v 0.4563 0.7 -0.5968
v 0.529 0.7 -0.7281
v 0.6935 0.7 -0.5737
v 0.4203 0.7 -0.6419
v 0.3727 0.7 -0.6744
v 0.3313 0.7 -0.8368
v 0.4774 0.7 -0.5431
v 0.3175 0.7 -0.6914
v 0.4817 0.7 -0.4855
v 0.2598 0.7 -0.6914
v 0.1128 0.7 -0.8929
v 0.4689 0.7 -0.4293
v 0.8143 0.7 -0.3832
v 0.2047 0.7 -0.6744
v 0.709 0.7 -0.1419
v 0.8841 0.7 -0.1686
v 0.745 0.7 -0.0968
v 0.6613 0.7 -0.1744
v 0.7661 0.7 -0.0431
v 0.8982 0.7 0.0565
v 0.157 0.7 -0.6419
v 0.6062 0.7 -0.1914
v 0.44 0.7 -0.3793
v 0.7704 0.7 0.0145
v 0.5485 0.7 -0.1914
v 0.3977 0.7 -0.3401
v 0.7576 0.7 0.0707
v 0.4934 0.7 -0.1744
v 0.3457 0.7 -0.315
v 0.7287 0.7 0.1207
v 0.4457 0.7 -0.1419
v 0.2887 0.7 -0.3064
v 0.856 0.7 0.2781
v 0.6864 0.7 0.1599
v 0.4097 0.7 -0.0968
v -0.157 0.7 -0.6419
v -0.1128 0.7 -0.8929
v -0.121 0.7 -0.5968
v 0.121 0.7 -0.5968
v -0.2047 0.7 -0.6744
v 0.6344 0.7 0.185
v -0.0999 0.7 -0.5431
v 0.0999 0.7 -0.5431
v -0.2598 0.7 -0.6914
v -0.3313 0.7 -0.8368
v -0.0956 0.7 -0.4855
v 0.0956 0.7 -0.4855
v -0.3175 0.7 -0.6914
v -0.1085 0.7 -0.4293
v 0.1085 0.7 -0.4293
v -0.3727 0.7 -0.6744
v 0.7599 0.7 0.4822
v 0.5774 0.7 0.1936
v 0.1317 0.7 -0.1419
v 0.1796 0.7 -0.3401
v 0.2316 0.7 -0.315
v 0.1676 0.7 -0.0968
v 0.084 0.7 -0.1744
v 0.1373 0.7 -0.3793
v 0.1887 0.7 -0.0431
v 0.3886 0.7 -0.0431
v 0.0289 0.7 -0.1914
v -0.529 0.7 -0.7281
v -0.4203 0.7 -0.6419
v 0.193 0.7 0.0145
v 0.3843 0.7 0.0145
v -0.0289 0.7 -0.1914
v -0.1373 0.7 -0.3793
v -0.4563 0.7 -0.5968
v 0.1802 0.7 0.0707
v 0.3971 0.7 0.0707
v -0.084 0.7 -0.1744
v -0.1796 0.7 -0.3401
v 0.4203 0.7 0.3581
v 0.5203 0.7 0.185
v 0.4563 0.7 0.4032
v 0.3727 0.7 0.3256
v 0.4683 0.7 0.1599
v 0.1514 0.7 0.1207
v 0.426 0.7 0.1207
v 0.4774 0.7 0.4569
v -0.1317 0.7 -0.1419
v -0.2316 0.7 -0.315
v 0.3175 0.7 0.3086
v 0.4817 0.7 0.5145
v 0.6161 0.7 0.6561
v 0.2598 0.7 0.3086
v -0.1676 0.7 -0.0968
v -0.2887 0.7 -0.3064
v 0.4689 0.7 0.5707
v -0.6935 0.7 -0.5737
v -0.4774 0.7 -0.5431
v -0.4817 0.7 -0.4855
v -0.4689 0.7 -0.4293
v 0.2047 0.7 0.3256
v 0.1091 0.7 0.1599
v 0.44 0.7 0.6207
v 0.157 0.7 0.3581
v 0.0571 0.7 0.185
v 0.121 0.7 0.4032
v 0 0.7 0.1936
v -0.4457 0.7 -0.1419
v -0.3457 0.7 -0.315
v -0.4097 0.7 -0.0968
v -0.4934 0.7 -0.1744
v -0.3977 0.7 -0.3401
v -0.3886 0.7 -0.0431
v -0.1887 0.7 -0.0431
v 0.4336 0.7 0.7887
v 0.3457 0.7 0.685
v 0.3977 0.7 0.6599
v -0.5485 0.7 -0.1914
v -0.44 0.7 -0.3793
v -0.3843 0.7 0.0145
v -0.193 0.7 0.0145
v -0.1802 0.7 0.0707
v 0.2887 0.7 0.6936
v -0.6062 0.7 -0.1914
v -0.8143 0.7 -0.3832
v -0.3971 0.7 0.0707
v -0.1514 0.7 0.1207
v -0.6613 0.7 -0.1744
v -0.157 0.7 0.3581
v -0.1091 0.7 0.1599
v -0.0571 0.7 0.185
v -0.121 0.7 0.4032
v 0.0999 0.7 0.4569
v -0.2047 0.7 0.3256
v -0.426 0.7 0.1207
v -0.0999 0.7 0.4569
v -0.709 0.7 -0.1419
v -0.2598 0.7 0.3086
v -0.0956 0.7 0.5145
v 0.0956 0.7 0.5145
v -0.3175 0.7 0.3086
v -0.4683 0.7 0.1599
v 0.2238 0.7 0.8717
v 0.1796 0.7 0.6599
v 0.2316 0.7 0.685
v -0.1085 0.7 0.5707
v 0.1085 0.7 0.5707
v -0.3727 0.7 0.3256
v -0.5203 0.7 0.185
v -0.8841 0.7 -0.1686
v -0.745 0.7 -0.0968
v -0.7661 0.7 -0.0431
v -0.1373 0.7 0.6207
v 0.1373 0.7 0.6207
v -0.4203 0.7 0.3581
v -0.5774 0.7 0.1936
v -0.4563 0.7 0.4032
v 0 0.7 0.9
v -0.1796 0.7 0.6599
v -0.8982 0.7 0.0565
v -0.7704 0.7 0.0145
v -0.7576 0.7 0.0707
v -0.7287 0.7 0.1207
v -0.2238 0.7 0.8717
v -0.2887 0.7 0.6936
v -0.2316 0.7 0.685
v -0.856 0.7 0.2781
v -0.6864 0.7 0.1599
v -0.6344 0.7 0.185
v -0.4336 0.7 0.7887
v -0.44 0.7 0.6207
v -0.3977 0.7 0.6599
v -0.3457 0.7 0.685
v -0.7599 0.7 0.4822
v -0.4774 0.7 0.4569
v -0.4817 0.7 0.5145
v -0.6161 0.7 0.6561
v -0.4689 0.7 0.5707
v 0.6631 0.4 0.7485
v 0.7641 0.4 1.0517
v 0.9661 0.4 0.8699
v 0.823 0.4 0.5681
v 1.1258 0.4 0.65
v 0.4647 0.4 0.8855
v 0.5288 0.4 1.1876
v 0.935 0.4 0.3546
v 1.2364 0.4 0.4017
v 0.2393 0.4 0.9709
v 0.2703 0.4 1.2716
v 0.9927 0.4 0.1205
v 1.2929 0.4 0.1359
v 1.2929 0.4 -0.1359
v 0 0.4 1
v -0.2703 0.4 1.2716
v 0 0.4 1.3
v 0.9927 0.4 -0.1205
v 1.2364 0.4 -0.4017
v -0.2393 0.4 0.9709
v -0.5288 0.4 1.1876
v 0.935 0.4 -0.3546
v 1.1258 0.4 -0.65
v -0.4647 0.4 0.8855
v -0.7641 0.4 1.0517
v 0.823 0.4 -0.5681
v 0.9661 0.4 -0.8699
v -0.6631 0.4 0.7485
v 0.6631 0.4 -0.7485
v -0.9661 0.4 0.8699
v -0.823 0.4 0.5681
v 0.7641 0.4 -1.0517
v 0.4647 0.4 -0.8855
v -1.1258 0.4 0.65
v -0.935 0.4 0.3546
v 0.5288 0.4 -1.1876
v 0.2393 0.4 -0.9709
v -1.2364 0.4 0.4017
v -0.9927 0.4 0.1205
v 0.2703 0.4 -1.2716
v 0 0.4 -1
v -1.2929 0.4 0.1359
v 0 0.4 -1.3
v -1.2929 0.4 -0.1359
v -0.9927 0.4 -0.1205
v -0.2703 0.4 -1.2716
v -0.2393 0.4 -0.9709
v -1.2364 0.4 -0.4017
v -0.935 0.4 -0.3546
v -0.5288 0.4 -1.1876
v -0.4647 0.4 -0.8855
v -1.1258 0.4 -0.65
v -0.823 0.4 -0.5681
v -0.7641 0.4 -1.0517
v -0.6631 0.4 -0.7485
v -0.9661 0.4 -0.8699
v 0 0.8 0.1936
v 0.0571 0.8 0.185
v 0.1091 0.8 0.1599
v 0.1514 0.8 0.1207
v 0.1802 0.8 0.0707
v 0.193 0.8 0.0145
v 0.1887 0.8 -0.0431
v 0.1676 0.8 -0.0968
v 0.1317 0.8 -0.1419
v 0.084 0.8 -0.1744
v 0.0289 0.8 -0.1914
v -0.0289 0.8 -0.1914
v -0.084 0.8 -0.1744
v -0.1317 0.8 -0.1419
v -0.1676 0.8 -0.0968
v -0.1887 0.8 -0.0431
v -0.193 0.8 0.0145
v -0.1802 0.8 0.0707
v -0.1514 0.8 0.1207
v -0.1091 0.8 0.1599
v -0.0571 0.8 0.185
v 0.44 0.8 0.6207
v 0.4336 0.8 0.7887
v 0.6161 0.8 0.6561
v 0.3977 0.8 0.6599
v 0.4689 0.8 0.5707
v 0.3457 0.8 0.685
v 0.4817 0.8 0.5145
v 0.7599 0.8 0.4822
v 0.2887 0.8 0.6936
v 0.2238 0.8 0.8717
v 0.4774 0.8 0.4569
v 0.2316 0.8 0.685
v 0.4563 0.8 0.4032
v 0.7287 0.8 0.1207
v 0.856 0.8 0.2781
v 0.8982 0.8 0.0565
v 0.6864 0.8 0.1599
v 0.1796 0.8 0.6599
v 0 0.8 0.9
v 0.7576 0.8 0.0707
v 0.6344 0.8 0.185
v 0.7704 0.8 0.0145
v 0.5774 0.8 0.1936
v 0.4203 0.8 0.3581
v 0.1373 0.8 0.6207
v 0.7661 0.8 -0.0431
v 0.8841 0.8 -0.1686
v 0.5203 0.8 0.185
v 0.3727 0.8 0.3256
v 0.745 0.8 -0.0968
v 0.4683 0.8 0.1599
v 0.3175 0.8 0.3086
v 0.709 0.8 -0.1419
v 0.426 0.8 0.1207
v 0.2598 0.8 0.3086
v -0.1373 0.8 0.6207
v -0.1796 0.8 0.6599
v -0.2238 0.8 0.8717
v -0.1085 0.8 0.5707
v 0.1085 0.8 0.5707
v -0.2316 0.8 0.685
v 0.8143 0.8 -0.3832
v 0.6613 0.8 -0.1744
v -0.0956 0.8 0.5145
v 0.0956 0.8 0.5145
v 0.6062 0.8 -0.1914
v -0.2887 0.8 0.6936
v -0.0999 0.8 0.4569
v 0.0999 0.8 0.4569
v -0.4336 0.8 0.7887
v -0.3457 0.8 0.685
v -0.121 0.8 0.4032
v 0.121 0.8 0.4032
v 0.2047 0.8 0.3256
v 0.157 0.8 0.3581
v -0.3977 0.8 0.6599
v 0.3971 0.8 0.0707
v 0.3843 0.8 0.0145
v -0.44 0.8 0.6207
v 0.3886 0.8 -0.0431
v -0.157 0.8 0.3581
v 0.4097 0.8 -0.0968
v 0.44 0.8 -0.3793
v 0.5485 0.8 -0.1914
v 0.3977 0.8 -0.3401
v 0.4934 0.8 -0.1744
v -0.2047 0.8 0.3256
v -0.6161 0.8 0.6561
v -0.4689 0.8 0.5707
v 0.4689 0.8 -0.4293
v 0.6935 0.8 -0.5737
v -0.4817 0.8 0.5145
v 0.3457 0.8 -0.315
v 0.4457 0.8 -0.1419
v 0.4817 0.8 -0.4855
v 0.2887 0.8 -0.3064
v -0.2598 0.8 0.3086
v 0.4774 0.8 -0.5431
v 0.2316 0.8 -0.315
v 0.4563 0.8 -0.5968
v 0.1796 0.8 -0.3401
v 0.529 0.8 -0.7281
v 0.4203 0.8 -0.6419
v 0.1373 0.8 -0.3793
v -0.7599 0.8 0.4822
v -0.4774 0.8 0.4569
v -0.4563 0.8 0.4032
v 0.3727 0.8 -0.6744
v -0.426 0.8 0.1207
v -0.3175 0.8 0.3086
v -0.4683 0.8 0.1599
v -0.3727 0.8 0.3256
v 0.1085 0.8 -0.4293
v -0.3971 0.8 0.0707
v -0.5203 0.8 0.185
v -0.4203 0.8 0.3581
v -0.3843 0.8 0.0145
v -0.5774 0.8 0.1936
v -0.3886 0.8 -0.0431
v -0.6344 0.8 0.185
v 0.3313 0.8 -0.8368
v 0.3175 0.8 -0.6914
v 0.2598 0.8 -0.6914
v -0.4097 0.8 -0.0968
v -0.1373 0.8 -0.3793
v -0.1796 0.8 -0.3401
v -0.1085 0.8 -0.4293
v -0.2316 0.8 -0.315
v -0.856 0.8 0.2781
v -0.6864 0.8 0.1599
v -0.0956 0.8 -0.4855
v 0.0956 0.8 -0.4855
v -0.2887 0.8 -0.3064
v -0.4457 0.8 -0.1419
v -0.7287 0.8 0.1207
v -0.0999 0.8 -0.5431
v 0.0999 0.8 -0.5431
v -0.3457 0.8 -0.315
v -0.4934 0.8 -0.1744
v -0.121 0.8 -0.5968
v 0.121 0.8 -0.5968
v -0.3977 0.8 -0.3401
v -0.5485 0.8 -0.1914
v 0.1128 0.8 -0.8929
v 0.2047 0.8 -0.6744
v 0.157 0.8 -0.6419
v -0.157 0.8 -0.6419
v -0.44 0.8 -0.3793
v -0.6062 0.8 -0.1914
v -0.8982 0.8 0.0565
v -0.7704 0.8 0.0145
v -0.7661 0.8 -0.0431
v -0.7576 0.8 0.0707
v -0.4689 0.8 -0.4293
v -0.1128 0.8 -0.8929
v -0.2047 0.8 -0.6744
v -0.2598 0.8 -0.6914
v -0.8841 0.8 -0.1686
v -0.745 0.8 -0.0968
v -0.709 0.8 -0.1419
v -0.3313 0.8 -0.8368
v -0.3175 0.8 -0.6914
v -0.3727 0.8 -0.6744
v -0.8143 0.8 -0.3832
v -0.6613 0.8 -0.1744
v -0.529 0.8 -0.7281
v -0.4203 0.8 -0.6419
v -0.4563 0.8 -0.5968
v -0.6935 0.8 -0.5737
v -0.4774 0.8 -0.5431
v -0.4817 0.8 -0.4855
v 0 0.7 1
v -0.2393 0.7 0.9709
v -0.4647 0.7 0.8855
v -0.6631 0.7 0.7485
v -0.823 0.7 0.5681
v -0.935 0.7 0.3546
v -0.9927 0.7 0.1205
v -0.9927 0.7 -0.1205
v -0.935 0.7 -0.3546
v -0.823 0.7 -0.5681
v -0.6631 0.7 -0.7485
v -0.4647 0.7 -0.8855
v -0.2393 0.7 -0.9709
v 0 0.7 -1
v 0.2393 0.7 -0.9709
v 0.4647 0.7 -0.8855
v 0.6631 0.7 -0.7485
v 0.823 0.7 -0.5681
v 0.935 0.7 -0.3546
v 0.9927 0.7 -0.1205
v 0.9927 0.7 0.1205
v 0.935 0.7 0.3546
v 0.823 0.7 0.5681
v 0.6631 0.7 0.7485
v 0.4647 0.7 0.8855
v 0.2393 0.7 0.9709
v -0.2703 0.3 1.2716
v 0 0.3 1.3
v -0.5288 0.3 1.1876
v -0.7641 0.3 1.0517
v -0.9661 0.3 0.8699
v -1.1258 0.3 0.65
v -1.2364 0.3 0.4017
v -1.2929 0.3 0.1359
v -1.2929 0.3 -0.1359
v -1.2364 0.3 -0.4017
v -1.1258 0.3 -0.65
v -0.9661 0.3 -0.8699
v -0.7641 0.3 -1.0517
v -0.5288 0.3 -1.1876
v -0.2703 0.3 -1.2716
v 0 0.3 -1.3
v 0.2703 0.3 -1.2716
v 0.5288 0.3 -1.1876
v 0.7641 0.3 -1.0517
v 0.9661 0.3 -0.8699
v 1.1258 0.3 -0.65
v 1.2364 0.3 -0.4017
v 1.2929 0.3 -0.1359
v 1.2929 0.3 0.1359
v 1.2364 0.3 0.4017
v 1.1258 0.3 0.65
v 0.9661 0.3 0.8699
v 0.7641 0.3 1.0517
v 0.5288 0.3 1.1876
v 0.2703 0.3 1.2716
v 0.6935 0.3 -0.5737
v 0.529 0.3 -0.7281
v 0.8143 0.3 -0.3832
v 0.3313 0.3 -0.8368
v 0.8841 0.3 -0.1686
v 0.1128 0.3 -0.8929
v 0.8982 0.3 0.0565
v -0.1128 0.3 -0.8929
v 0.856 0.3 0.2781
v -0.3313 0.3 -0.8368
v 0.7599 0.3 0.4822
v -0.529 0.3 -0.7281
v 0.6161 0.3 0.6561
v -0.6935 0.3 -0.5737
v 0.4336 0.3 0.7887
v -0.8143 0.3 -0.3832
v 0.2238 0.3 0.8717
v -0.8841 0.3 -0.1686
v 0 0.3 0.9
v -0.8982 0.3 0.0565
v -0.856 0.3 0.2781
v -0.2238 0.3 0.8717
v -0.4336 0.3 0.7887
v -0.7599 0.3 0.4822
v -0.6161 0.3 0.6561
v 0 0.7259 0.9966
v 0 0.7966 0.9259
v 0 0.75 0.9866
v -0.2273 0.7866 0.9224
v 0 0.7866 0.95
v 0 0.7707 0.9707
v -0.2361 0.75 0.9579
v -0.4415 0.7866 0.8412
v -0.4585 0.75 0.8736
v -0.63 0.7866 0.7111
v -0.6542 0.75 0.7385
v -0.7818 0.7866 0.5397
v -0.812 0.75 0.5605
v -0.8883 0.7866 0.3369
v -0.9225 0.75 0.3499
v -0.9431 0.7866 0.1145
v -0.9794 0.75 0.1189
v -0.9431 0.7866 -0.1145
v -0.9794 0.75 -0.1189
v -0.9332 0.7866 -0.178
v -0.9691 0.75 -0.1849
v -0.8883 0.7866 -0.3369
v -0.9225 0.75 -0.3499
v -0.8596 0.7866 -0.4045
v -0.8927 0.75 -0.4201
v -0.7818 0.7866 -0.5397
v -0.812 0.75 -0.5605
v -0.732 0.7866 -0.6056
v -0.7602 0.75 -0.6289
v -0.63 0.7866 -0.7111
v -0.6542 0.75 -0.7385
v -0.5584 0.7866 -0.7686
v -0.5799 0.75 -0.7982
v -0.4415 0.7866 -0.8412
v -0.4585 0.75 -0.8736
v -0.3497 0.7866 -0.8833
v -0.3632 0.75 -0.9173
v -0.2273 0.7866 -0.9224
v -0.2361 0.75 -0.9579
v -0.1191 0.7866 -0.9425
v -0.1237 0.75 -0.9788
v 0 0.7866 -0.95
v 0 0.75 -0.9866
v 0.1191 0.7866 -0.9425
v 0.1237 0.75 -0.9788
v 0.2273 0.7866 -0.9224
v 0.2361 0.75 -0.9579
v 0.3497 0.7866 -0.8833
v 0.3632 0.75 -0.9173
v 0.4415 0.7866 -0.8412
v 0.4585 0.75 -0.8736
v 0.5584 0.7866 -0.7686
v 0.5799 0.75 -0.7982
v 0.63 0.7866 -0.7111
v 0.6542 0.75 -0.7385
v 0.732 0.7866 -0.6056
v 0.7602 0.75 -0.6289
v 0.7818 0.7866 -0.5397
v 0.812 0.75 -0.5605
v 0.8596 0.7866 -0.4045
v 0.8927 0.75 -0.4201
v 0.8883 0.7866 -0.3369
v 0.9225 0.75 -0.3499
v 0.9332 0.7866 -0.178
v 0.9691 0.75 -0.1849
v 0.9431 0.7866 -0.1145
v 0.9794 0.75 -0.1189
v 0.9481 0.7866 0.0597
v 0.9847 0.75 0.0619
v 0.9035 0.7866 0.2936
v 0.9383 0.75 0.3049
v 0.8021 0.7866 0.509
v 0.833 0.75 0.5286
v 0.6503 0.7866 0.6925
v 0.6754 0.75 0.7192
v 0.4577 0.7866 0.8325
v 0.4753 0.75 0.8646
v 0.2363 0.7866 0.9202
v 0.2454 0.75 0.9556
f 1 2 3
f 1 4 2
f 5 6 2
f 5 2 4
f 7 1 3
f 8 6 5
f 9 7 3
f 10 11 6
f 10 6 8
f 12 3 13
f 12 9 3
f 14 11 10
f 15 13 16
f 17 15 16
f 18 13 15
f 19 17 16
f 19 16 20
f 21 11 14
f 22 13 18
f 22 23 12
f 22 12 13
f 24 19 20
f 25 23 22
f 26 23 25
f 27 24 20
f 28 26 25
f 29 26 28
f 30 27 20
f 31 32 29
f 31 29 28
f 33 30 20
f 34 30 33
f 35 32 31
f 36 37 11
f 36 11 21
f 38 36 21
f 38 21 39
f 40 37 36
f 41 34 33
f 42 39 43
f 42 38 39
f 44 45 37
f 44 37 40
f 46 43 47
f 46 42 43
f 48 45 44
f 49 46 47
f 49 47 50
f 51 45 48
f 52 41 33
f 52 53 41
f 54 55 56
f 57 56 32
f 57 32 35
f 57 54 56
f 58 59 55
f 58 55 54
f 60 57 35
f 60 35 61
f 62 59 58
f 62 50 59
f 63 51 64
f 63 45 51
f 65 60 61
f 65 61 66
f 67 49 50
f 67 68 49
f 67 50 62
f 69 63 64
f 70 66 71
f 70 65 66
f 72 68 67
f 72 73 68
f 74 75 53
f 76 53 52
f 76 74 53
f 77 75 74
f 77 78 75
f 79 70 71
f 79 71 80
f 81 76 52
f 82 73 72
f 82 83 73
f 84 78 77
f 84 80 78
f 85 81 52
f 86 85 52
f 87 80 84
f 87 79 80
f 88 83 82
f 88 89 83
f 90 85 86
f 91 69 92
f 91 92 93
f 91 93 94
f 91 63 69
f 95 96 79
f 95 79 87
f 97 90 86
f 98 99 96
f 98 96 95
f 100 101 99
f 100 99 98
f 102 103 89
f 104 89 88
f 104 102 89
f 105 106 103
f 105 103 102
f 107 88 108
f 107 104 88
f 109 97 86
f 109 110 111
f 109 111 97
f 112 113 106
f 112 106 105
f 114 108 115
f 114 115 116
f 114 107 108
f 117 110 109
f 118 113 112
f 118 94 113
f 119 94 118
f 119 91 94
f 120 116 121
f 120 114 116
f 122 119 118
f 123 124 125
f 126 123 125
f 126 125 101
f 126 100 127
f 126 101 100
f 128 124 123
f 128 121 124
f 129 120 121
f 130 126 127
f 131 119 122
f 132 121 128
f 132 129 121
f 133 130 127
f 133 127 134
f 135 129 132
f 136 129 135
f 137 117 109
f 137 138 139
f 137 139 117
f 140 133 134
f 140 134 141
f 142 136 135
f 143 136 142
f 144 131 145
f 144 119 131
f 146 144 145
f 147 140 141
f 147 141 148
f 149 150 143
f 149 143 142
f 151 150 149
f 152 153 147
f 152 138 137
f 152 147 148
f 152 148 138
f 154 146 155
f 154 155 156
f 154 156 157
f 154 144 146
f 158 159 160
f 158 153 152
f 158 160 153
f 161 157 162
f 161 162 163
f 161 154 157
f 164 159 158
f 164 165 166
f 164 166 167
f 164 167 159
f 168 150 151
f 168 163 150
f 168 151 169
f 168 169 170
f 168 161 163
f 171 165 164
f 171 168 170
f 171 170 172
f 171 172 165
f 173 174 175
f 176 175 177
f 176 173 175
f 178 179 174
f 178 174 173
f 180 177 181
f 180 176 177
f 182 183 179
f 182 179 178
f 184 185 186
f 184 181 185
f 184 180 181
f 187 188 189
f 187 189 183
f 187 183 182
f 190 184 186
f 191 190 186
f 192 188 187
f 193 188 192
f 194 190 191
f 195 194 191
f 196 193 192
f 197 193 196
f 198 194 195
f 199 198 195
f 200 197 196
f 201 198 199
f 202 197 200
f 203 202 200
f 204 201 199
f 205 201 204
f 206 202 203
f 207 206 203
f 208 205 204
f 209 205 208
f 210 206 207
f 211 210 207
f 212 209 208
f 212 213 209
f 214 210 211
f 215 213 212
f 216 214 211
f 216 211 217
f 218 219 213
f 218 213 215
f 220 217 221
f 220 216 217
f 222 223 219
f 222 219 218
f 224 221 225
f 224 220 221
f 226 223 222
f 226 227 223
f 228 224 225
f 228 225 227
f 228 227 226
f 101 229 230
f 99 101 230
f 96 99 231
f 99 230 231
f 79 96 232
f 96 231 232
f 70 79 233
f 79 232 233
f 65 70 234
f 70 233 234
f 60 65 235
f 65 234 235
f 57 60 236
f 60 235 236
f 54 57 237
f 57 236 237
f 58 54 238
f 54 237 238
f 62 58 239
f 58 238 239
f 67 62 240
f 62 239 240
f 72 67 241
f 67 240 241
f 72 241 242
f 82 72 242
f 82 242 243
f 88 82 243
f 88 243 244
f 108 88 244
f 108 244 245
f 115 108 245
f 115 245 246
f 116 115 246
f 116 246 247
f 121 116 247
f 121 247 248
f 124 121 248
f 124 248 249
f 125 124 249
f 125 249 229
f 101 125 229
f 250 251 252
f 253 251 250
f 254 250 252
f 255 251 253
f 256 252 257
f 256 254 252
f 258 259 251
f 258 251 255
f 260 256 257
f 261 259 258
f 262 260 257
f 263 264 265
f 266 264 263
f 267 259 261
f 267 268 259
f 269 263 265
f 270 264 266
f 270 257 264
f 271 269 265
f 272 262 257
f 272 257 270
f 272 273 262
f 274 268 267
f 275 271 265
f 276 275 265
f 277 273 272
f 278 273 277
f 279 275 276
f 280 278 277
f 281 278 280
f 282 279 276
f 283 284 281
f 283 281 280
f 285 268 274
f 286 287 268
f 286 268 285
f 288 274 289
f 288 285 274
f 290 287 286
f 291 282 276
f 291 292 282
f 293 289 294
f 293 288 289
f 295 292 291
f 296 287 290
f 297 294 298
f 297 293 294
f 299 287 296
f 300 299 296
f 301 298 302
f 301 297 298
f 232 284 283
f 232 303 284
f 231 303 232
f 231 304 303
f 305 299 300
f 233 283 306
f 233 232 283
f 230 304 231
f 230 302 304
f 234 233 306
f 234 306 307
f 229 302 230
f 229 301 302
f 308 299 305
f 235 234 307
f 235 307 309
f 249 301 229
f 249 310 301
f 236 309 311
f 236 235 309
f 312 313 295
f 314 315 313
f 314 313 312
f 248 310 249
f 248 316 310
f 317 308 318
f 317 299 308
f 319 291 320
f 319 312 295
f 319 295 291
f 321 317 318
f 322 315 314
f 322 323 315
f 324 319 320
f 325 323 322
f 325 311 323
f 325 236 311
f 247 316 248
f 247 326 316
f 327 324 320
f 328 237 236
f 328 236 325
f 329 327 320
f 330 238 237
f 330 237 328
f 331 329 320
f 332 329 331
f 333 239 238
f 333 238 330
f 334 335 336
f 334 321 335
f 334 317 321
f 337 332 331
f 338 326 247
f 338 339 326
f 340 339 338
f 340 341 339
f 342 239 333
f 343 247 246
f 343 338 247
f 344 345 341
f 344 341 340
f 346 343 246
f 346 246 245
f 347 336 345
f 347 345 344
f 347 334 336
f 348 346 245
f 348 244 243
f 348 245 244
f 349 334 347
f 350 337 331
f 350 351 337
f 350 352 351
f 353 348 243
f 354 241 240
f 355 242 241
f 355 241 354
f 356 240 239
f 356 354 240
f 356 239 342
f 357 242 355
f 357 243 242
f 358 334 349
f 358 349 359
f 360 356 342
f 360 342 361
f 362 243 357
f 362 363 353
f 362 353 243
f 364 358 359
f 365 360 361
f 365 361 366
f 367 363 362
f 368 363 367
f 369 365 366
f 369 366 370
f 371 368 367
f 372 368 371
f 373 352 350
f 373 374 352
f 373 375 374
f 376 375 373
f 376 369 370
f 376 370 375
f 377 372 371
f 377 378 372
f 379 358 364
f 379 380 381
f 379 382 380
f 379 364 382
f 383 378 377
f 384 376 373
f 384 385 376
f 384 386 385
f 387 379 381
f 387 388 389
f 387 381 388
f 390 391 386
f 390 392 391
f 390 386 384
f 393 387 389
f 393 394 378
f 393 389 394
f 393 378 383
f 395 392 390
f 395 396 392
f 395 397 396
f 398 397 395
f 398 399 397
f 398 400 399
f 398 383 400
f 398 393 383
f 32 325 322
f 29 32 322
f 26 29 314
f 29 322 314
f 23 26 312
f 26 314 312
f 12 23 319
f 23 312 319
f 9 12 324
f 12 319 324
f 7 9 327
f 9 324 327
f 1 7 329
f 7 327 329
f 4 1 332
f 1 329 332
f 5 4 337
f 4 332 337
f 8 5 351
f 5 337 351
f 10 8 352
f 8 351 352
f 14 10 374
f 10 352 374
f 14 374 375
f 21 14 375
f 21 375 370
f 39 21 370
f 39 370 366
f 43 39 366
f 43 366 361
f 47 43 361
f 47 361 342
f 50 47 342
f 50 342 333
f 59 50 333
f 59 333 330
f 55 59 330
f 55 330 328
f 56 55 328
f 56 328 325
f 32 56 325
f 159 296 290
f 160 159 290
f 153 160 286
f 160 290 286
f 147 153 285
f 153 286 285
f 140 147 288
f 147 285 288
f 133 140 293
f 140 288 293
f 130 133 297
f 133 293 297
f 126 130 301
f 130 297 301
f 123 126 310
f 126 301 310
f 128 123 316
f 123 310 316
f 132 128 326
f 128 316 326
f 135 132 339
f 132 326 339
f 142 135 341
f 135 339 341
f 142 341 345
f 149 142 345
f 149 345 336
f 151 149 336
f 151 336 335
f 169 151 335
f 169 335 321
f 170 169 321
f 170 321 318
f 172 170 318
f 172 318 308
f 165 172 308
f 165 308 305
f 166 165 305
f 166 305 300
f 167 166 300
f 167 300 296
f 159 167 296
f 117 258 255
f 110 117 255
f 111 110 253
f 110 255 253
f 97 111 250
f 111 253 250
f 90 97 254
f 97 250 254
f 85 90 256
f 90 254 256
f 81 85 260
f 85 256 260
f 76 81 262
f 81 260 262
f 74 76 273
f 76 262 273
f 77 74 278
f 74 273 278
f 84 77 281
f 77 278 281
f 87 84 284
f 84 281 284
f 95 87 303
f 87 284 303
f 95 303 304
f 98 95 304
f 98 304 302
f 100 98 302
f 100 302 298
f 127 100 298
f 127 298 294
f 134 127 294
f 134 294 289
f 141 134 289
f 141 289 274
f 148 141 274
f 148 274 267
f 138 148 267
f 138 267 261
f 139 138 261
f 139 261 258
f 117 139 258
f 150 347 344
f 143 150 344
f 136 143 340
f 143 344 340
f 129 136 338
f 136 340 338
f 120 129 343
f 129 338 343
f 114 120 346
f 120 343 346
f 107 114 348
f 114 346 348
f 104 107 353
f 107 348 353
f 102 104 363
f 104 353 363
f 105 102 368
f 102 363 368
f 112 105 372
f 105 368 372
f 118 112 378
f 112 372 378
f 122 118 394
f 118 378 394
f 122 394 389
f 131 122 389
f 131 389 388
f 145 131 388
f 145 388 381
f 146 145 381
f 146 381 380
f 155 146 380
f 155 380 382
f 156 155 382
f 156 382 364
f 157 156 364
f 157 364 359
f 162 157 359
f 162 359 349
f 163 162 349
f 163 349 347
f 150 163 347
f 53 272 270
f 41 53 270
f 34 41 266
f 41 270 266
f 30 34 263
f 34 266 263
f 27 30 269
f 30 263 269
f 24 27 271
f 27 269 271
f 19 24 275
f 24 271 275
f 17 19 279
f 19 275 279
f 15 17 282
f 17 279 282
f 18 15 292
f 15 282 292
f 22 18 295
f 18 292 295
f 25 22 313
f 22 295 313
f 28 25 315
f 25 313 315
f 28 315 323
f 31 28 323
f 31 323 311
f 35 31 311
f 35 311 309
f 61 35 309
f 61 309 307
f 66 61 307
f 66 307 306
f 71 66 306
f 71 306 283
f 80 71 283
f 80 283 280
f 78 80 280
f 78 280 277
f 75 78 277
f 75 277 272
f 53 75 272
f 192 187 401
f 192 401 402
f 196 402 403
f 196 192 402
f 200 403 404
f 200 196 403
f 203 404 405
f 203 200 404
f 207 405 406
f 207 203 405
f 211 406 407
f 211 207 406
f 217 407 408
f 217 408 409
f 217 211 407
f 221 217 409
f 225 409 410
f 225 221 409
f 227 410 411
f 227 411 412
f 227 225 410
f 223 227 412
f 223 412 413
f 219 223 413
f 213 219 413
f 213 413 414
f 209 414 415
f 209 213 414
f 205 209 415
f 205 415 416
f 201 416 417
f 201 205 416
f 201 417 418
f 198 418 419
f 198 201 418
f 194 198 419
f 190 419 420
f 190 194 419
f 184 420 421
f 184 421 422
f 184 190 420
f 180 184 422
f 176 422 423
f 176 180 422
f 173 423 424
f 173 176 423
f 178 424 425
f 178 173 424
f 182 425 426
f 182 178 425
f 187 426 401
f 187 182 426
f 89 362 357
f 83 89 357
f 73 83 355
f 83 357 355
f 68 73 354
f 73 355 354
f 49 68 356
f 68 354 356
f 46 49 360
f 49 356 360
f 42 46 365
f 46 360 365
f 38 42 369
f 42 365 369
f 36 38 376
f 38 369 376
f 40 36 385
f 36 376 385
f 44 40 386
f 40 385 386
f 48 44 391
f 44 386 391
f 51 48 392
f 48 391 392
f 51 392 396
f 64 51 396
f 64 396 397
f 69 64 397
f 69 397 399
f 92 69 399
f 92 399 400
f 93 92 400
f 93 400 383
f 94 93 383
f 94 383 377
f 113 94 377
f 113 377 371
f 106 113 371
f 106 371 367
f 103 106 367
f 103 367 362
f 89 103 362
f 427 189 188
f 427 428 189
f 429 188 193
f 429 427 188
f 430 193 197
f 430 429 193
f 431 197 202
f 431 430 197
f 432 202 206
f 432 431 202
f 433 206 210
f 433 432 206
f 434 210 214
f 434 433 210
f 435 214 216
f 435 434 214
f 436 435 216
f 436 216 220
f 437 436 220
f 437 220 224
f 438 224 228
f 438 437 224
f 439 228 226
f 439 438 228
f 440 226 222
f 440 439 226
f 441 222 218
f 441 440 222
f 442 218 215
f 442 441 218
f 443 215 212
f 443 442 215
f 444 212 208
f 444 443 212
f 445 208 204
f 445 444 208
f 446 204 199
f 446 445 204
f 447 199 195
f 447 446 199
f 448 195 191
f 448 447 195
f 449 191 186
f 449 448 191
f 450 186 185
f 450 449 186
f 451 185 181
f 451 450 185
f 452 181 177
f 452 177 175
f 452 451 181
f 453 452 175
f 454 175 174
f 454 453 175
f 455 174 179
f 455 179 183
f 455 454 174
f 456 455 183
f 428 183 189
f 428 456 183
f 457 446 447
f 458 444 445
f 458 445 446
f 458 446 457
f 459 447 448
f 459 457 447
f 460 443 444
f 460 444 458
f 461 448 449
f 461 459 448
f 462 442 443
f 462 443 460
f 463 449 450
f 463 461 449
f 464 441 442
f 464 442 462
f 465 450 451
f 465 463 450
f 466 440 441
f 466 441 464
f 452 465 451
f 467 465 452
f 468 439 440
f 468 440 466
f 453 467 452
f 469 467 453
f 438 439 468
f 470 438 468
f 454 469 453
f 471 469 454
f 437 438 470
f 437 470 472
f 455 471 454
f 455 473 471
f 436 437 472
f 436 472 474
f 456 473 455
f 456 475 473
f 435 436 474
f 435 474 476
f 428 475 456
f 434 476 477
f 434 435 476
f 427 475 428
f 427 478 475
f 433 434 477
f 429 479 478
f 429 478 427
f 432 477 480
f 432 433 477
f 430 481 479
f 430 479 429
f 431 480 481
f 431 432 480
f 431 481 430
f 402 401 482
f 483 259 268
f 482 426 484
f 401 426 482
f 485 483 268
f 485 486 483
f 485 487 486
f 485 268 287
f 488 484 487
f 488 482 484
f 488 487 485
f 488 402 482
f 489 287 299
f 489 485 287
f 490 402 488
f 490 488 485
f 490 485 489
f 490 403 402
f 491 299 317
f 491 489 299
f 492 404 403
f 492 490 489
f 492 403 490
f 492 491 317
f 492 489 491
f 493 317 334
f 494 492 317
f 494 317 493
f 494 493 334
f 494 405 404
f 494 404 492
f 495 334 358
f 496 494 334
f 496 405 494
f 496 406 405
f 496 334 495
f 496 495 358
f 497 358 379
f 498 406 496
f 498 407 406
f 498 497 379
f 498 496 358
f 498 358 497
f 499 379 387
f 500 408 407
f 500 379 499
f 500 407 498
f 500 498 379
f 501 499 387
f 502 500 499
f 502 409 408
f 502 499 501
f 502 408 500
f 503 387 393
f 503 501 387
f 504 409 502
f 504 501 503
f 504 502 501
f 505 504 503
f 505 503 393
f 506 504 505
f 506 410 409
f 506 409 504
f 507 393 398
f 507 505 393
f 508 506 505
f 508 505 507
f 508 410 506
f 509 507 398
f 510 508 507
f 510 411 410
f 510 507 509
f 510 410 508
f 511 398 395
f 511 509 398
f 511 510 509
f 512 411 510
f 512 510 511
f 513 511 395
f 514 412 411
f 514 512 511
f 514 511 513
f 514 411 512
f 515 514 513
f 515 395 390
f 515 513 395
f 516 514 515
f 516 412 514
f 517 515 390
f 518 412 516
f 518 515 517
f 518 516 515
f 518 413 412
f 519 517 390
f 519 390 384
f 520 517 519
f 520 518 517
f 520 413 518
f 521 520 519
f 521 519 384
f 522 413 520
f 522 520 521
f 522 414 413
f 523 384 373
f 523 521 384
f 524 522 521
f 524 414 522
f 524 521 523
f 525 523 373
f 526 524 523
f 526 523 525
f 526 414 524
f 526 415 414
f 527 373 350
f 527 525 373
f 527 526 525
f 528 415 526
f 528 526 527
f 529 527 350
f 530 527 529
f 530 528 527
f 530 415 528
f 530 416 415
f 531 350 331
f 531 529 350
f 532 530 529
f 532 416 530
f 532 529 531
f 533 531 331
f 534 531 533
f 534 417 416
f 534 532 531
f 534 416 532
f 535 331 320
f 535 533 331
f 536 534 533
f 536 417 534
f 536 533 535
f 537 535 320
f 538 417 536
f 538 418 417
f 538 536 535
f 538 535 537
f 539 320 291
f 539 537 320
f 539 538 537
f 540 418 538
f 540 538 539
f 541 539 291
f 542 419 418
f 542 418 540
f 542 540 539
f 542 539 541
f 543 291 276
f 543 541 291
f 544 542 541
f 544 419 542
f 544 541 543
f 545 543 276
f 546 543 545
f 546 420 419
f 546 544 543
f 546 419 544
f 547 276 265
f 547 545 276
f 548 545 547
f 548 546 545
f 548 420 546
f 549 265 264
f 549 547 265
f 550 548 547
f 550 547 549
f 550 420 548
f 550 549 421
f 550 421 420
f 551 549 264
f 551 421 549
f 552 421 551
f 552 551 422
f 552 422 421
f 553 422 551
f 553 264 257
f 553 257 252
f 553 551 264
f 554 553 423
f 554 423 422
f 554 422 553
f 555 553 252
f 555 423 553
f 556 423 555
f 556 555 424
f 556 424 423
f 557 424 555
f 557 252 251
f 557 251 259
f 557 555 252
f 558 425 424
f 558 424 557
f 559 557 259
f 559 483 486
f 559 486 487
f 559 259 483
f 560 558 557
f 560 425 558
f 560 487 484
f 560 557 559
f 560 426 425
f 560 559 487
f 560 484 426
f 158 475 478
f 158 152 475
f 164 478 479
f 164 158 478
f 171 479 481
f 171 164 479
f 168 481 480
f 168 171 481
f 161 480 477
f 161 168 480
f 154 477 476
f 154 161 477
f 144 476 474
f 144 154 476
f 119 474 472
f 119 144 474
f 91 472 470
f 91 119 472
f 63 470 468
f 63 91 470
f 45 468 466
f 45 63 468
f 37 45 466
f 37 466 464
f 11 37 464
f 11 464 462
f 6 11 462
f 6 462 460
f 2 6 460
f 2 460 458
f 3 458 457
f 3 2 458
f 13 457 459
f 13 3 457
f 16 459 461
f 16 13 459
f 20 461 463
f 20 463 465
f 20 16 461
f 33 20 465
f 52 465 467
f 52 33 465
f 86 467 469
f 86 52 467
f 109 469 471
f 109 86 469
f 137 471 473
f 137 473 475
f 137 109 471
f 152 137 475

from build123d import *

# Parameters (mm, degrees)
FILLET_3_R          = 0.1
SKETCH_2_R          = 0.193585201
CUT_EXTRUDE_1_DEPTH = 2.905255888


with BuildPart() as part:
    # 草图1 → 旋转1 (revolve)
    with BuildSketch(Plane.XY, mode=Mode.PRIVATE) as revolve_1_sk:
        Polygon((0, 0.8), (1, 0.8), (1, 0.4), (1.3, 0.4), (1.3, 0.3), (0.9, 0.3), (0.9, 0.7), (0, 0.7), align=None)
    revolve(revolve_1_sk.sketch.rotate(Axis((0, 2.362244898, 0), (0, -1, 0)), 90), axis=Axis((0, 2.362244898, 0), (0, -1, 0)))

    # 圆角3
    fillet_3_edges = [part.edges().sort_by_distance(p)[0] for p in [
        (0, 0.8, -1),
    ]]
    fillet(fillet_3_edges, radius=FILLET_3_R)

    # 草图2 → 切除-拉伸1 (cut, through all)
    with BuildSketch(Plane(origin=(0, 0.8, 0), x_dir=(1, 0, 0), z_dir=(0, 1, 0))):
        with Locations(Location((0, 0, 0), (0, 0, 270))):
            Circle(SKETCH_2_R)
        with Locations(Location((-0.288675135, 0.5, 0), (0, 0, 270))):
            Circle(SKETCH_2_R)
        with Locations(Location((0.288675135, 0.5, 0), (0, 0, 270))):
            Circle(SKETCH_2_R)
        with Locations(Location((0.577350269, 0, 0), (0, 0, 270))):
            Circle(SKETCH_2_R)
        with Locations(Location((0.288675135, -0.5, 0), (0, 0, 270))):
            Circle(SKETCH_2_R)
        with Locations(Location((-0.288675135, -0.5, 0), (0, 0, 270))):
            Circle(SKETCH_2_R)
        with Locations(Location((-0.577350269, 0, 0), (0, 0, 270))):
            Circle(SKETCH_2_R)
    extrude(amount=-CUT_EXTRUDE_1_DEPTH, mode=Mode.SUBTRACT)


solid = part.part
